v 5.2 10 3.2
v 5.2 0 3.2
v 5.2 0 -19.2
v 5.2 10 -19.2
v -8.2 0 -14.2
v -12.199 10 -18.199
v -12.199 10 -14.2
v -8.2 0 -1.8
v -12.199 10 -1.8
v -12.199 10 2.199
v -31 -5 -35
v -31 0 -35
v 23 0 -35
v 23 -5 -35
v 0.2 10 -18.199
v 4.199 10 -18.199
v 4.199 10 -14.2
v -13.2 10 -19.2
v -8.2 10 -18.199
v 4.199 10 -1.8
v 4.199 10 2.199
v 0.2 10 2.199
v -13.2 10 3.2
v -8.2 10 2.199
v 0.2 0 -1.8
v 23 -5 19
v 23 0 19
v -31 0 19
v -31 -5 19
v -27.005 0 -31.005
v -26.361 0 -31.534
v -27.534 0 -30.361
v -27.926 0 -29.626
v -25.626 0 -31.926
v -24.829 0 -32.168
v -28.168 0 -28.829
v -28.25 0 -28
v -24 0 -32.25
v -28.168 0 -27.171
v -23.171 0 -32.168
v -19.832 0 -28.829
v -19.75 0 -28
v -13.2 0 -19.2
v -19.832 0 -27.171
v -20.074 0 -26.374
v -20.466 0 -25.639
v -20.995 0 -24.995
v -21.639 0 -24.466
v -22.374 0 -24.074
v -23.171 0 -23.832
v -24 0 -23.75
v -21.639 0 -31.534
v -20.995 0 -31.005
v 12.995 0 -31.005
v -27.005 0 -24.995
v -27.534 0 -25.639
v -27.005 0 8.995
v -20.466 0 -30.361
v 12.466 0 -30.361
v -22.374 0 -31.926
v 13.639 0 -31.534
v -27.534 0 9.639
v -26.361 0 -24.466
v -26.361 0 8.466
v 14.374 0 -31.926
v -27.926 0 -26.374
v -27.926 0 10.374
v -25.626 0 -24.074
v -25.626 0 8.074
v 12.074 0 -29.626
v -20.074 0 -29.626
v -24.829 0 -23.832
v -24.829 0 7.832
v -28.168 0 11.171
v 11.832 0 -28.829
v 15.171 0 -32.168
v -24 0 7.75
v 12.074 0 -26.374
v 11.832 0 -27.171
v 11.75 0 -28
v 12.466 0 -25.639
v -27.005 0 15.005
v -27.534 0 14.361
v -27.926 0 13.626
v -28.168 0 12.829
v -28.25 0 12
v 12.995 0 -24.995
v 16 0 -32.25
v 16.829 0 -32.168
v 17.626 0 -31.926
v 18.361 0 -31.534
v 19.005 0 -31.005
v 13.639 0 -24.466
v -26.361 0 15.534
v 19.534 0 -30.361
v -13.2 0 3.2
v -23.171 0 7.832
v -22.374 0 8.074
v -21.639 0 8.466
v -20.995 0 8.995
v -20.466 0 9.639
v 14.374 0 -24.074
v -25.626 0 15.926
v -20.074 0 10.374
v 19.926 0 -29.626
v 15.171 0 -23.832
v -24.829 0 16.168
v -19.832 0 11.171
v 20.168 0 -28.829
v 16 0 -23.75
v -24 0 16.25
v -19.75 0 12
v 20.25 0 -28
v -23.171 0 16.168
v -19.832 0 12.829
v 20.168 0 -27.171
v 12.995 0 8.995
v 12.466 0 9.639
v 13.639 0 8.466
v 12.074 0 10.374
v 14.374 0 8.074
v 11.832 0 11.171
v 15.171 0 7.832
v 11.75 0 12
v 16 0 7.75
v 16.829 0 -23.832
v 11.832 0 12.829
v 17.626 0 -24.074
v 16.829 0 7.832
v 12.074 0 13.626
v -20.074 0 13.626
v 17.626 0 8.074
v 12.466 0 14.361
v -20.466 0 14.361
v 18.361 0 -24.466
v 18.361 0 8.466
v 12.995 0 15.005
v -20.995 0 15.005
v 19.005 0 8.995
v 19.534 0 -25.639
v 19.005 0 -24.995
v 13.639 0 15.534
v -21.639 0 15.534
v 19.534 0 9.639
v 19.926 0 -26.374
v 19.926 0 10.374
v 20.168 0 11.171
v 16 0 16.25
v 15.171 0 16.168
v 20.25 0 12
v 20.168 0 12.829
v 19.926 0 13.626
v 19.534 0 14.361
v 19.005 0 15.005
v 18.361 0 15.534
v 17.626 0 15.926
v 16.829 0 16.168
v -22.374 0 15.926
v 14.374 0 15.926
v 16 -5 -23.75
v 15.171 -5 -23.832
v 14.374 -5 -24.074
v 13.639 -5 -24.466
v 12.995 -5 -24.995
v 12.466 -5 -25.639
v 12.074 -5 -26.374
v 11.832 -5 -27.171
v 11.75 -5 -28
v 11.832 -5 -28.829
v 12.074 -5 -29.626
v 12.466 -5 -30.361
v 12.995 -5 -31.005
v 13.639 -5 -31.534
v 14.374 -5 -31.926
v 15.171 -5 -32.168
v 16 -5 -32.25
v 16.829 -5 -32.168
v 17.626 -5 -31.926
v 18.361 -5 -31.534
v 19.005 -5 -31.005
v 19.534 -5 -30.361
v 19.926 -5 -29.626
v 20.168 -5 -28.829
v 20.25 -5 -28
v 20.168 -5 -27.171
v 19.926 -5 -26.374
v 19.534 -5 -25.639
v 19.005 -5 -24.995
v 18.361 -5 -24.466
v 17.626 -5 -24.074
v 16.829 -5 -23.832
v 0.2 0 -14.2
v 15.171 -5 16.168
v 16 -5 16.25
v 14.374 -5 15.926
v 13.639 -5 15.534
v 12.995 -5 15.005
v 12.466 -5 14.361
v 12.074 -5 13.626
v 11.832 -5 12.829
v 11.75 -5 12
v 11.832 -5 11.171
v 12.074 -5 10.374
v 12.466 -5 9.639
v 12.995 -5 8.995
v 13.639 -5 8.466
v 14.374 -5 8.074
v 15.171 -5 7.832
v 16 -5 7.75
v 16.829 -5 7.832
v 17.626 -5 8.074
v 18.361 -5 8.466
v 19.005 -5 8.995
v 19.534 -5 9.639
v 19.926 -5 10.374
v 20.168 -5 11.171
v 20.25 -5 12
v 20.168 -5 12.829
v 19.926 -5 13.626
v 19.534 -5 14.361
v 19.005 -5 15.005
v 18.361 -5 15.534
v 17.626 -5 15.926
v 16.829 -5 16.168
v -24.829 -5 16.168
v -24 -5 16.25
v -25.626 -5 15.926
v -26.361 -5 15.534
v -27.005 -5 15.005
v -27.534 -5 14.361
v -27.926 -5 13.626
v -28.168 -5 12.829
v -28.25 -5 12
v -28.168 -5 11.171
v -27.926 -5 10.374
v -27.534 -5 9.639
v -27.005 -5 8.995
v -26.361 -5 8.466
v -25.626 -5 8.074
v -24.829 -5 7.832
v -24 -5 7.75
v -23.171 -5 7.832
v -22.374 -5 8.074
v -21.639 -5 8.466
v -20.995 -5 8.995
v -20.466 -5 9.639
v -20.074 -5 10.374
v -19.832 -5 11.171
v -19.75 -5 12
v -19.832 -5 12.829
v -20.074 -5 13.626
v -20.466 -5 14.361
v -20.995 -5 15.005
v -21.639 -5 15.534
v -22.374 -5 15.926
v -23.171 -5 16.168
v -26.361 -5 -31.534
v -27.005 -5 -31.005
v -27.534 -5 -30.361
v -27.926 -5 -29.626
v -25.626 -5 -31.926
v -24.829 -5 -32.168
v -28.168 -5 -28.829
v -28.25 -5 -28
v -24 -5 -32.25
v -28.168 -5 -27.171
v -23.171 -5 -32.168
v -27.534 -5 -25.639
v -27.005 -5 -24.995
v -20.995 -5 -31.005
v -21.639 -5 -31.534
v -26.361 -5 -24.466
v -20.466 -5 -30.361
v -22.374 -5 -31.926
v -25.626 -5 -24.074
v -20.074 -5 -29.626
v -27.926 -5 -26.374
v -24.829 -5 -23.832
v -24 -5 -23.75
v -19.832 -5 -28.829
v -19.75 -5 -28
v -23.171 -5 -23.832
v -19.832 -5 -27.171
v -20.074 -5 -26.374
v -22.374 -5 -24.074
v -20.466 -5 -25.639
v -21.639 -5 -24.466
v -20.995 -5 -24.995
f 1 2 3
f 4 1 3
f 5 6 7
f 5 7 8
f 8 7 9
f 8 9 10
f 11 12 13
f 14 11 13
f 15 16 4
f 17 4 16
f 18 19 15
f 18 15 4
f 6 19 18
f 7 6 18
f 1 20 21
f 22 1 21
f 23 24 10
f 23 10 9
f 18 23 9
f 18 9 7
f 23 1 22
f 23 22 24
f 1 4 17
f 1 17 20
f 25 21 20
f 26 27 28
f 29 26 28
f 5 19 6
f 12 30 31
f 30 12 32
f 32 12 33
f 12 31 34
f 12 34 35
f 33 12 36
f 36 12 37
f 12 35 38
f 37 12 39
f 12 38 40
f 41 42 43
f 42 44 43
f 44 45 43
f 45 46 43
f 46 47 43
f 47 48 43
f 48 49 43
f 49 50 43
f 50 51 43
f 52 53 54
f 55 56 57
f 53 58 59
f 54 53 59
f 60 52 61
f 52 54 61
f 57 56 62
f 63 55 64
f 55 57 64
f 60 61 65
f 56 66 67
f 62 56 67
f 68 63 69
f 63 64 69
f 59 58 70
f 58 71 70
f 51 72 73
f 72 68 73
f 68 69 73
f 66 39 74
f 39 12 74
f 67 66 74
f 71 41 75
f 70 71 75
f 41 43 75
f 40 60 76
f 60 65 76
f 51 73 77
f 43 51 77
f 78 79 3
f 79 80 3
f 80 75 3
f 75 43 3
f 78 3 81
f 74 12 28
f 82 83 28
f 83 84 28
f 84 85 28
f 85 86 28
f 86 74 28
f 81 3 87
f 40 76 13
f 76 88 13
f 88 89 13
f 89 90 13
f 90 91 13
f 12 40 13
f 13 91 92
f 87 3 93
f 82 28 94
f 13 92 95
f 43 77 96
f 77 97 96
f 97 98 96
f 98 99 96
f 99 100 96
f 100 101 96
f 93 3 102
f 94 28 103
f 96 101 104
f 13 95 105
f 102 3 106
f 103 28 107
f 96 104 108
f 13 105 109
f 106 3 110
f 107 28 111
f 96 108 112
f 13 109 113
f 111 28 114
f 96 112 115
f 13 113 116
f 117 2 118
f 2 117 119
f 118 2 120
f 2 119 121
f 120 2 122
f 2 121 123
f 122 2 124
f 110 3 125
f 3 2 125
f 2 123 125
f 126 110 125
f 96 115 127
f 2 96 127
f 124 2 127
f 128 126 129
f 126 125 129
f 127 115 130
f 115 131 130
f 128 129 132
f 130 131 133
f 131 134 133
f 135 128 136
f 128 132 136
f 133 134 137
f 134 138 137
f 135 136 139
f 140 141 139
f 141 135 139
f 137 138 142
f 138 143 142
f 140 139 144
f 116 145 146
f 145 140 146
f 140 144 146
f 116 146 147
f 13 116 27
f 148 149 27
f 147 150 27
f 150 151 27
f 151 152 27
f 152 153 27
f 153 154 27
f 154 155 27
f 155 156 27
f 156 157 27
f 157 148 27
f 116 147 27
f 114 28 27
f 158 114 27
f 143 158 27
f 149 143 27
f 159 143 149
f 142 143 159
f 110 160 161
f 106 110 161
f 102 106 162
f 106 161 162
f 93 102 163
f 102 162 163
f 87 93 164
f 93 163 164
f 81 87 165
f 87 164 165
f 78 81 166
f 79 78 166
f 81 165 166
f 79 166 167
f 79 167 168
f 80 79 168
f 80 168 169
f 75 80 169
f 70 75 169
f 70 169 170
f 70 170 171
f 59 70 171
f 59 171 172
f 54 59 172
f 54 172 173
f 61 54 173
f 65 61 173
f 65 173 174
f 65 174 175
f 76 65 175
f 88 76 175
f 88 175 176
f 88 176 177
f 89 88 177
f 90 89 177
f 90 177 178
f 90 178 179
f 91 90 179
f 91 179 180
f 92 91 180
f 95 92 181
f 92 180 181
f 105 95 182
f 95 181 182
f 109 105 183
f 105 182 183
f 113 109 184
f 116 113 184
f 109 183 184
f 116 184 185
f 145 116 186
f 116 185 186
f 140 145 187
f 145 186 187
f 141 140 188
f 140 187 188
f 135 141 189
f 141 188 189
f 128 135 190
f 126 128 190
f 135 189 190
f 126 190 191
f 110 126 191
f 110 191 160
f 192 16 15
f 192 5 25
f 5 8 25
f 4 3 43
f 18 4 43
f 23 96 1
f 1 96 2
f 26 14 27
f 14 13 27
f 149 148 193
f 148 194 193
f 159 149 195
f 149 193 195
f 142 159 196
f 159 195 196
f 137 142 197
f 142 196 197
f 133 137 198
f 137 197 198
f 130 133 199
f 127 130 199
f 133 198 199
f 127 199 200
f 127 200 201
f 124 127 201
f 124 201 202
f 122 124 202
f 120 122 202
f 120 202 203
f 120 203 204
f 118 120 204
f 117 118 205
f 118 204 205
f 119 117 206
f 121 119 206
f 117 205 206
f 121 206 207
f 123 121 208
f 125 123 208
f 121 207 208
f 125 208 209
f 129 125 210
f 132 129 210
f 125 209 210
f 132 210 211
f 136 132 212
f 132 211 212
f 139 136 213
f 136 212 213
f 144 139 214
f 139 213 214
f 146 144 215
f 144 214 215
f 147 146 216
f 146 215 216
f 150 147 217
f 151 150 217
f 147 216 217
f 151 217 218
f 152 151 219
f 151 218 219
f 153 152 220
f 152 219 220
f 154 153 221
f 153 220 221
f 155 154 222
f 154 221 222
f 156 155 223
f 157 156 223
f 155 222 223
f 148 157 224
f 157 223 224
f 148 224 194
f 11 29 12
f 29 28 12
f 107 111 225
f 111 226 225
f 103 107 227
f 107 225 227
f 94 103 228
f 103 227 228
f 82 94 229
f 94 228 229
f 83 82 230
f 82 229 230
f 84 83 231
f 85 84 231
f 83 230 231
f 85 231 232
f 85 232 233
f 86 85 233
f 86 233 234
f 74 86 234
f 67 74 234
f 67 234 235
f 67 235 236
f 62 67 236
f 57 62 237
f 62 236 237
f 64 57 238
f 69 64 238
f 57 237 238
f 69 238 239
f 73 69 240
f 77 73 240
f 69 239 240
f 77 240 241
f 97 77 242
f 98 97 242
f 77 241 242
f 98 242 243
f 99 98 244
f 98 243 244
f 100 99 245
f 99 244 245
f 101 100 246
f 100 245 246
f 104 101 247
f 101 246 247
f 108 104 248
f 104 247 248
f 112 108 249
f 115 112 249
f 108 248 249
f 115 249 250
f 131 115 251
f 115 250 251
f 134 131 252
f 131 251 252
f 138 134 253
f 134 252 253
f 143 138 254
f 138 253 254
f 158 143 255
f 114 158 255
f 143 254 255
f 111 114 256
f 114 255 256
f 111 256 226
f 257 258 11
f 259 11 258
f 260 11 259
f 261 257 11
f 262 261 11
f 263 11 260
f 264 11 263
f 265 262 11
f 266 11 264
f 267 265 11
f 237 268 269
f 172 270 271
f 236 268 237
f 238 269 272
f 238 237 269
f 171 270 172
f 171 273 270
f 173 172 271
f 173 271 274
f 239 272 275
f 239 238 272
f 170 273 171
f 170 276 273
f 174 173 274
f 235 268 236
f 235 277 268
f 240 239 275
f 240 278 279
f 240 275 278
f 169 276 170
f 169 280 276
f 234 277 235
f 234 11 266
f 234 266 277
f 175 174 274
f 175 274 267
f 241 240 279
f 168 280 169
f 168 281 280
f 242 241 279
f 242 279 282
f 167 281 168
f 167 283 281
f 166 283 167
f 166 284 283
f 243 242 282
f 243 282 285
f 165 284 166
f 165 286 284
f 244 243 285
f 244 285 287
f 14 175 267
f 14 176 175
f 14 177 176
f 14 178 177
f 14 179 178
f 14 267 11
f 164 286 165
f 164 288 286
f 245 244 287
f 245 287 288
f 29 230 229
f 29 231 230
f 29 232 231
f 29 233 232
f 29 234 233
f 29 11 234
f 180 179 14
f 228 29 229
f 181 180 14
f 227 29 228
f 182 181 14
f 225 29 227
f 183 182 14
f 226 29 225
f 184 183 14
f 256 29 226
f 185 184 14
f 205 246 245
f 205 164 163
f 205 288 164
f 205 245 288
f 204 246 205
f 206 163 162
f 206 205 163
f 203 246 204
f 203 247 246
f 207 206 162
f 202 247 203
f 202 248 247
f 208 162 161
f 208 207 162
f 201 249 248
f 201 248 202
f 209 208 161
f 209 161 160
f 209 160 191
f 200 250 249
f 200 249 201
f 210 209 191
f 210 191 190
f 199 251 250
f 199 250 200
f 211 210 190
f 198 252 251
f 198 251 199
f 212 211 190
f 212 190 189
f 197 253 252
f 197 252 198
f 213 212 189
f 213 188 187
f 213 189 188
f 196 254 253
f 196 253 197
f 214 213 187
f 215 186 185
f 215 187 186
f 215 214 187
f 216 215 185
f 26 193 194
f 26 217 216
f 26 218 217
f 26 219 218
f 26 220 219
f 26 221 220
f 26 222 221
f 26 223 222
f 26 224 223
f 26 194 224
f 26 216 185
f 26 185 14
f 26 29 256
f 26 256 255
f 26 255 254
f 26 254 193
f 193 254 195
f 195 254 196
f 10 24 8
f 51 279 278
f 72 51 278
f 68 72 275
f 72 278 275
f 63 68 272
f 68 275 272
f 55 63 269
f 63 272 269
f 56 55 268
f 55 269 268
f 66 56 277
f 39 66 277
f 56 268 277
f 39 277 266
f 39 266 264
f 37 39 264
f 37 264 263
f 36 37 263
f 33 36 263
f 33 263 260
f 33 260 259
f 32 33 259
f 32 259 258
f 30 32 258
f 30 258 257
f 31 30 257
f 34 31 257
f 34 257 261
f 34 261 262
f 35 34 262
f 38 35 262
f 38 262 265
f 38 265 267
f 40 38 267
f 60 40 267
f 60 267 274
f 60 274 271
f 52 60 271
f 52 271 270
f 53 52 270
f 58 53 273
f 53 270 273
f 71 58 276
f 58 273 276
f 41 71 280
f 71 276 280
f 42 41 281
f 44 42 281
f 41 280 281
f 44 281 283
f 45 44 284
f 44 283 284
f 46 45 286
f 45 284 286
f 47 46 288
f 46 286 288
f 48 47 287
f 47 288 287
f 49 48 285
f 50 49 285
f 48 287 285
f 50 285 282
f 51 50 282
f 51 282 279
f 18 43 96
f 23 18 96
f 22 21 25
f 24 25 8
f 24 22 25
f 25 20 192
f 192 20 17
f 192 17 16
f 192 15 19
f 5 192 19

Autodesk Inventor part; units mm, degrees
ref_plane "YZ Plane" through (0, 0, 0) normal (1, 0, 0) x (0, 1, 0)
ref_plane "XZ Plane" through (0, 0, 0) normal (0, 1, 0) x (-1, 0, 0)
ref_plane "XY Plane" through (0, 0, 0) normal (0, 0, 1) x (1, 0, 0)
sketch "Skizze1" plane through (0, 0, 0) normal (0, 1, 0) x (-1, 0, 0)
  line L0 (8.2, -1.8) -> (8.2, -14.2)
  line L1 (8.2, -14.2) -> (-0.2, -14.2)
  line L2 (-0.2, -14.2) -> (-0.2, -1.8)
  line L3 (-7, 5) -> (15, 5)
  line L4 (15, 5) -> (15, -21)
  line L5 (15, -21) -> (-7, -21)
  line L6 (-7, -21) -> (-7, 5)
  line L7 (8.2, -1.8) -> (-0.2, -1.8)
  line L8 (13.2, 3.2) -> (-5.2, 3.2)
  line L9 (-5.2, 3.2) -> (-5.2, -19.2)
  line L10 (-5.2, -19.2) -> (13.2, -19.2)
  line L11 (13.2, -19.2) -> (13.2, 3.2)
  point P0 (0, 0)
  point P1 (8, 0)
  point P2 (4, 0)
  point P3 (4, 5)
  point P4 (4, -14.2)
  point P5 (13.2, -8)
  point P6 (8.2, -8)
  point P7 (4, -19.2)
  point P8 (-5.2, -8)
  dimension "d2" = 6.8
  dimension "d3" = 6.8
  dimension "d56" = 26
  dimension "d57" = 22
  dimension "d58" = 6.8
  dimension "d59" = 6.8
  dimension "d61" = 5
  dimension "d62" = 5
  dimension "d63" = 5
  dimension "d65" = 1.8
  dimension "d66" = 0.2
  dimension "d67" = 5
extrude "Extrusion1" add sketch "Skizze1" along normal blind 10 contours L11 L10 L9 L8
sketch "Skizze2" plane through (0, 0, 0) normal (0, -1, 0) x (1, 0, 0)
  line L0 (23, 19) -> (-31, 19)
  line L1 (-31, 19) -> (-31, -35)
  line L2 (-31, -35) -> (23, -35)
  line L3 (23, -35) -> (23, 19)
  line L4 (-15, -21) -> (-15, 5) projected
  line L5 (7, -21) -> (-15, -21) projected
  line L6 (7, 5) -> (7, -21) projected
  line L7 (-15, 5) -> (7, 5) projected
  point P0 (0, 0)
  dimension "d11" = 16
  dimension "d12" = 14
  dimension "d13" = 16
  dimension "d14" = 14
  dimension "d35" = 54
  dimension "d36" = 54
extrude "Extrusion2" add sketch "Skizze2" along normal blind 5 contours L3 L2 L1 L0 | L4 L7 L6 L5
sketch "Skizze4" plane through (0, 0, 0) normal (0, 1, 0) x (1, 0, 0)
  line L0 (23, 35) -> (23, -19) projected
  line L1 (-31, 35) -> (23, 35) projected
  line L2 (23, -19) -> (-31, -19) projected
  line L3 (-31, -19) -> (-31, 35) projected
  point P0 (0, 0)
  point P1 (16, 28)
  point P2 (16, -12)
  point P3 (-24, -12)
  point P4 (-24, 28)
  dimension "d44" = 7
  dimension "d45" = 7
  dimension "d46" = 7
  dimension "d47" = 7
  dimension "d48" = 7
  dimension "d49" = 7
  dimension "d50" = 7
  dimension "d51" = 7
  dimension "d52" = 40
  dimension "d53" = 40
  dimension "d54" = 40
  dimension "d55" = 40
hole "Bohrung1" at (16, 0, -28) at (16, 0, 12) at (-24, 0, 12) at (-24, 0, -28) direction (0, -1, 0) diameter 8.5 depth 5
chamfer "Fasen5" distance 10 angle 21.8 1 edges at (-8.2, 10, -8) measured on face at (-8.2, 3.3333, -5.9333)
chamfer "Fasen6" distance 10 angle 21.8 1 edges at (-4, 10, -1.8) measured on face at (-2.6, 3.3335, -1.8)
chamfer "Fasen7" distance 10 angle 21.8 1 edges at (0.2, 10, -8) measured on face at (0.2, 3.3335, -10.0667)
chamfer "Fasen8" distance 10 angle 21.8 1 edges at (-4, 10, -14.2) measured on face at (-2.6, 6.6668, -14.2)
properties part number "Magazin_1_3D-Druck"
